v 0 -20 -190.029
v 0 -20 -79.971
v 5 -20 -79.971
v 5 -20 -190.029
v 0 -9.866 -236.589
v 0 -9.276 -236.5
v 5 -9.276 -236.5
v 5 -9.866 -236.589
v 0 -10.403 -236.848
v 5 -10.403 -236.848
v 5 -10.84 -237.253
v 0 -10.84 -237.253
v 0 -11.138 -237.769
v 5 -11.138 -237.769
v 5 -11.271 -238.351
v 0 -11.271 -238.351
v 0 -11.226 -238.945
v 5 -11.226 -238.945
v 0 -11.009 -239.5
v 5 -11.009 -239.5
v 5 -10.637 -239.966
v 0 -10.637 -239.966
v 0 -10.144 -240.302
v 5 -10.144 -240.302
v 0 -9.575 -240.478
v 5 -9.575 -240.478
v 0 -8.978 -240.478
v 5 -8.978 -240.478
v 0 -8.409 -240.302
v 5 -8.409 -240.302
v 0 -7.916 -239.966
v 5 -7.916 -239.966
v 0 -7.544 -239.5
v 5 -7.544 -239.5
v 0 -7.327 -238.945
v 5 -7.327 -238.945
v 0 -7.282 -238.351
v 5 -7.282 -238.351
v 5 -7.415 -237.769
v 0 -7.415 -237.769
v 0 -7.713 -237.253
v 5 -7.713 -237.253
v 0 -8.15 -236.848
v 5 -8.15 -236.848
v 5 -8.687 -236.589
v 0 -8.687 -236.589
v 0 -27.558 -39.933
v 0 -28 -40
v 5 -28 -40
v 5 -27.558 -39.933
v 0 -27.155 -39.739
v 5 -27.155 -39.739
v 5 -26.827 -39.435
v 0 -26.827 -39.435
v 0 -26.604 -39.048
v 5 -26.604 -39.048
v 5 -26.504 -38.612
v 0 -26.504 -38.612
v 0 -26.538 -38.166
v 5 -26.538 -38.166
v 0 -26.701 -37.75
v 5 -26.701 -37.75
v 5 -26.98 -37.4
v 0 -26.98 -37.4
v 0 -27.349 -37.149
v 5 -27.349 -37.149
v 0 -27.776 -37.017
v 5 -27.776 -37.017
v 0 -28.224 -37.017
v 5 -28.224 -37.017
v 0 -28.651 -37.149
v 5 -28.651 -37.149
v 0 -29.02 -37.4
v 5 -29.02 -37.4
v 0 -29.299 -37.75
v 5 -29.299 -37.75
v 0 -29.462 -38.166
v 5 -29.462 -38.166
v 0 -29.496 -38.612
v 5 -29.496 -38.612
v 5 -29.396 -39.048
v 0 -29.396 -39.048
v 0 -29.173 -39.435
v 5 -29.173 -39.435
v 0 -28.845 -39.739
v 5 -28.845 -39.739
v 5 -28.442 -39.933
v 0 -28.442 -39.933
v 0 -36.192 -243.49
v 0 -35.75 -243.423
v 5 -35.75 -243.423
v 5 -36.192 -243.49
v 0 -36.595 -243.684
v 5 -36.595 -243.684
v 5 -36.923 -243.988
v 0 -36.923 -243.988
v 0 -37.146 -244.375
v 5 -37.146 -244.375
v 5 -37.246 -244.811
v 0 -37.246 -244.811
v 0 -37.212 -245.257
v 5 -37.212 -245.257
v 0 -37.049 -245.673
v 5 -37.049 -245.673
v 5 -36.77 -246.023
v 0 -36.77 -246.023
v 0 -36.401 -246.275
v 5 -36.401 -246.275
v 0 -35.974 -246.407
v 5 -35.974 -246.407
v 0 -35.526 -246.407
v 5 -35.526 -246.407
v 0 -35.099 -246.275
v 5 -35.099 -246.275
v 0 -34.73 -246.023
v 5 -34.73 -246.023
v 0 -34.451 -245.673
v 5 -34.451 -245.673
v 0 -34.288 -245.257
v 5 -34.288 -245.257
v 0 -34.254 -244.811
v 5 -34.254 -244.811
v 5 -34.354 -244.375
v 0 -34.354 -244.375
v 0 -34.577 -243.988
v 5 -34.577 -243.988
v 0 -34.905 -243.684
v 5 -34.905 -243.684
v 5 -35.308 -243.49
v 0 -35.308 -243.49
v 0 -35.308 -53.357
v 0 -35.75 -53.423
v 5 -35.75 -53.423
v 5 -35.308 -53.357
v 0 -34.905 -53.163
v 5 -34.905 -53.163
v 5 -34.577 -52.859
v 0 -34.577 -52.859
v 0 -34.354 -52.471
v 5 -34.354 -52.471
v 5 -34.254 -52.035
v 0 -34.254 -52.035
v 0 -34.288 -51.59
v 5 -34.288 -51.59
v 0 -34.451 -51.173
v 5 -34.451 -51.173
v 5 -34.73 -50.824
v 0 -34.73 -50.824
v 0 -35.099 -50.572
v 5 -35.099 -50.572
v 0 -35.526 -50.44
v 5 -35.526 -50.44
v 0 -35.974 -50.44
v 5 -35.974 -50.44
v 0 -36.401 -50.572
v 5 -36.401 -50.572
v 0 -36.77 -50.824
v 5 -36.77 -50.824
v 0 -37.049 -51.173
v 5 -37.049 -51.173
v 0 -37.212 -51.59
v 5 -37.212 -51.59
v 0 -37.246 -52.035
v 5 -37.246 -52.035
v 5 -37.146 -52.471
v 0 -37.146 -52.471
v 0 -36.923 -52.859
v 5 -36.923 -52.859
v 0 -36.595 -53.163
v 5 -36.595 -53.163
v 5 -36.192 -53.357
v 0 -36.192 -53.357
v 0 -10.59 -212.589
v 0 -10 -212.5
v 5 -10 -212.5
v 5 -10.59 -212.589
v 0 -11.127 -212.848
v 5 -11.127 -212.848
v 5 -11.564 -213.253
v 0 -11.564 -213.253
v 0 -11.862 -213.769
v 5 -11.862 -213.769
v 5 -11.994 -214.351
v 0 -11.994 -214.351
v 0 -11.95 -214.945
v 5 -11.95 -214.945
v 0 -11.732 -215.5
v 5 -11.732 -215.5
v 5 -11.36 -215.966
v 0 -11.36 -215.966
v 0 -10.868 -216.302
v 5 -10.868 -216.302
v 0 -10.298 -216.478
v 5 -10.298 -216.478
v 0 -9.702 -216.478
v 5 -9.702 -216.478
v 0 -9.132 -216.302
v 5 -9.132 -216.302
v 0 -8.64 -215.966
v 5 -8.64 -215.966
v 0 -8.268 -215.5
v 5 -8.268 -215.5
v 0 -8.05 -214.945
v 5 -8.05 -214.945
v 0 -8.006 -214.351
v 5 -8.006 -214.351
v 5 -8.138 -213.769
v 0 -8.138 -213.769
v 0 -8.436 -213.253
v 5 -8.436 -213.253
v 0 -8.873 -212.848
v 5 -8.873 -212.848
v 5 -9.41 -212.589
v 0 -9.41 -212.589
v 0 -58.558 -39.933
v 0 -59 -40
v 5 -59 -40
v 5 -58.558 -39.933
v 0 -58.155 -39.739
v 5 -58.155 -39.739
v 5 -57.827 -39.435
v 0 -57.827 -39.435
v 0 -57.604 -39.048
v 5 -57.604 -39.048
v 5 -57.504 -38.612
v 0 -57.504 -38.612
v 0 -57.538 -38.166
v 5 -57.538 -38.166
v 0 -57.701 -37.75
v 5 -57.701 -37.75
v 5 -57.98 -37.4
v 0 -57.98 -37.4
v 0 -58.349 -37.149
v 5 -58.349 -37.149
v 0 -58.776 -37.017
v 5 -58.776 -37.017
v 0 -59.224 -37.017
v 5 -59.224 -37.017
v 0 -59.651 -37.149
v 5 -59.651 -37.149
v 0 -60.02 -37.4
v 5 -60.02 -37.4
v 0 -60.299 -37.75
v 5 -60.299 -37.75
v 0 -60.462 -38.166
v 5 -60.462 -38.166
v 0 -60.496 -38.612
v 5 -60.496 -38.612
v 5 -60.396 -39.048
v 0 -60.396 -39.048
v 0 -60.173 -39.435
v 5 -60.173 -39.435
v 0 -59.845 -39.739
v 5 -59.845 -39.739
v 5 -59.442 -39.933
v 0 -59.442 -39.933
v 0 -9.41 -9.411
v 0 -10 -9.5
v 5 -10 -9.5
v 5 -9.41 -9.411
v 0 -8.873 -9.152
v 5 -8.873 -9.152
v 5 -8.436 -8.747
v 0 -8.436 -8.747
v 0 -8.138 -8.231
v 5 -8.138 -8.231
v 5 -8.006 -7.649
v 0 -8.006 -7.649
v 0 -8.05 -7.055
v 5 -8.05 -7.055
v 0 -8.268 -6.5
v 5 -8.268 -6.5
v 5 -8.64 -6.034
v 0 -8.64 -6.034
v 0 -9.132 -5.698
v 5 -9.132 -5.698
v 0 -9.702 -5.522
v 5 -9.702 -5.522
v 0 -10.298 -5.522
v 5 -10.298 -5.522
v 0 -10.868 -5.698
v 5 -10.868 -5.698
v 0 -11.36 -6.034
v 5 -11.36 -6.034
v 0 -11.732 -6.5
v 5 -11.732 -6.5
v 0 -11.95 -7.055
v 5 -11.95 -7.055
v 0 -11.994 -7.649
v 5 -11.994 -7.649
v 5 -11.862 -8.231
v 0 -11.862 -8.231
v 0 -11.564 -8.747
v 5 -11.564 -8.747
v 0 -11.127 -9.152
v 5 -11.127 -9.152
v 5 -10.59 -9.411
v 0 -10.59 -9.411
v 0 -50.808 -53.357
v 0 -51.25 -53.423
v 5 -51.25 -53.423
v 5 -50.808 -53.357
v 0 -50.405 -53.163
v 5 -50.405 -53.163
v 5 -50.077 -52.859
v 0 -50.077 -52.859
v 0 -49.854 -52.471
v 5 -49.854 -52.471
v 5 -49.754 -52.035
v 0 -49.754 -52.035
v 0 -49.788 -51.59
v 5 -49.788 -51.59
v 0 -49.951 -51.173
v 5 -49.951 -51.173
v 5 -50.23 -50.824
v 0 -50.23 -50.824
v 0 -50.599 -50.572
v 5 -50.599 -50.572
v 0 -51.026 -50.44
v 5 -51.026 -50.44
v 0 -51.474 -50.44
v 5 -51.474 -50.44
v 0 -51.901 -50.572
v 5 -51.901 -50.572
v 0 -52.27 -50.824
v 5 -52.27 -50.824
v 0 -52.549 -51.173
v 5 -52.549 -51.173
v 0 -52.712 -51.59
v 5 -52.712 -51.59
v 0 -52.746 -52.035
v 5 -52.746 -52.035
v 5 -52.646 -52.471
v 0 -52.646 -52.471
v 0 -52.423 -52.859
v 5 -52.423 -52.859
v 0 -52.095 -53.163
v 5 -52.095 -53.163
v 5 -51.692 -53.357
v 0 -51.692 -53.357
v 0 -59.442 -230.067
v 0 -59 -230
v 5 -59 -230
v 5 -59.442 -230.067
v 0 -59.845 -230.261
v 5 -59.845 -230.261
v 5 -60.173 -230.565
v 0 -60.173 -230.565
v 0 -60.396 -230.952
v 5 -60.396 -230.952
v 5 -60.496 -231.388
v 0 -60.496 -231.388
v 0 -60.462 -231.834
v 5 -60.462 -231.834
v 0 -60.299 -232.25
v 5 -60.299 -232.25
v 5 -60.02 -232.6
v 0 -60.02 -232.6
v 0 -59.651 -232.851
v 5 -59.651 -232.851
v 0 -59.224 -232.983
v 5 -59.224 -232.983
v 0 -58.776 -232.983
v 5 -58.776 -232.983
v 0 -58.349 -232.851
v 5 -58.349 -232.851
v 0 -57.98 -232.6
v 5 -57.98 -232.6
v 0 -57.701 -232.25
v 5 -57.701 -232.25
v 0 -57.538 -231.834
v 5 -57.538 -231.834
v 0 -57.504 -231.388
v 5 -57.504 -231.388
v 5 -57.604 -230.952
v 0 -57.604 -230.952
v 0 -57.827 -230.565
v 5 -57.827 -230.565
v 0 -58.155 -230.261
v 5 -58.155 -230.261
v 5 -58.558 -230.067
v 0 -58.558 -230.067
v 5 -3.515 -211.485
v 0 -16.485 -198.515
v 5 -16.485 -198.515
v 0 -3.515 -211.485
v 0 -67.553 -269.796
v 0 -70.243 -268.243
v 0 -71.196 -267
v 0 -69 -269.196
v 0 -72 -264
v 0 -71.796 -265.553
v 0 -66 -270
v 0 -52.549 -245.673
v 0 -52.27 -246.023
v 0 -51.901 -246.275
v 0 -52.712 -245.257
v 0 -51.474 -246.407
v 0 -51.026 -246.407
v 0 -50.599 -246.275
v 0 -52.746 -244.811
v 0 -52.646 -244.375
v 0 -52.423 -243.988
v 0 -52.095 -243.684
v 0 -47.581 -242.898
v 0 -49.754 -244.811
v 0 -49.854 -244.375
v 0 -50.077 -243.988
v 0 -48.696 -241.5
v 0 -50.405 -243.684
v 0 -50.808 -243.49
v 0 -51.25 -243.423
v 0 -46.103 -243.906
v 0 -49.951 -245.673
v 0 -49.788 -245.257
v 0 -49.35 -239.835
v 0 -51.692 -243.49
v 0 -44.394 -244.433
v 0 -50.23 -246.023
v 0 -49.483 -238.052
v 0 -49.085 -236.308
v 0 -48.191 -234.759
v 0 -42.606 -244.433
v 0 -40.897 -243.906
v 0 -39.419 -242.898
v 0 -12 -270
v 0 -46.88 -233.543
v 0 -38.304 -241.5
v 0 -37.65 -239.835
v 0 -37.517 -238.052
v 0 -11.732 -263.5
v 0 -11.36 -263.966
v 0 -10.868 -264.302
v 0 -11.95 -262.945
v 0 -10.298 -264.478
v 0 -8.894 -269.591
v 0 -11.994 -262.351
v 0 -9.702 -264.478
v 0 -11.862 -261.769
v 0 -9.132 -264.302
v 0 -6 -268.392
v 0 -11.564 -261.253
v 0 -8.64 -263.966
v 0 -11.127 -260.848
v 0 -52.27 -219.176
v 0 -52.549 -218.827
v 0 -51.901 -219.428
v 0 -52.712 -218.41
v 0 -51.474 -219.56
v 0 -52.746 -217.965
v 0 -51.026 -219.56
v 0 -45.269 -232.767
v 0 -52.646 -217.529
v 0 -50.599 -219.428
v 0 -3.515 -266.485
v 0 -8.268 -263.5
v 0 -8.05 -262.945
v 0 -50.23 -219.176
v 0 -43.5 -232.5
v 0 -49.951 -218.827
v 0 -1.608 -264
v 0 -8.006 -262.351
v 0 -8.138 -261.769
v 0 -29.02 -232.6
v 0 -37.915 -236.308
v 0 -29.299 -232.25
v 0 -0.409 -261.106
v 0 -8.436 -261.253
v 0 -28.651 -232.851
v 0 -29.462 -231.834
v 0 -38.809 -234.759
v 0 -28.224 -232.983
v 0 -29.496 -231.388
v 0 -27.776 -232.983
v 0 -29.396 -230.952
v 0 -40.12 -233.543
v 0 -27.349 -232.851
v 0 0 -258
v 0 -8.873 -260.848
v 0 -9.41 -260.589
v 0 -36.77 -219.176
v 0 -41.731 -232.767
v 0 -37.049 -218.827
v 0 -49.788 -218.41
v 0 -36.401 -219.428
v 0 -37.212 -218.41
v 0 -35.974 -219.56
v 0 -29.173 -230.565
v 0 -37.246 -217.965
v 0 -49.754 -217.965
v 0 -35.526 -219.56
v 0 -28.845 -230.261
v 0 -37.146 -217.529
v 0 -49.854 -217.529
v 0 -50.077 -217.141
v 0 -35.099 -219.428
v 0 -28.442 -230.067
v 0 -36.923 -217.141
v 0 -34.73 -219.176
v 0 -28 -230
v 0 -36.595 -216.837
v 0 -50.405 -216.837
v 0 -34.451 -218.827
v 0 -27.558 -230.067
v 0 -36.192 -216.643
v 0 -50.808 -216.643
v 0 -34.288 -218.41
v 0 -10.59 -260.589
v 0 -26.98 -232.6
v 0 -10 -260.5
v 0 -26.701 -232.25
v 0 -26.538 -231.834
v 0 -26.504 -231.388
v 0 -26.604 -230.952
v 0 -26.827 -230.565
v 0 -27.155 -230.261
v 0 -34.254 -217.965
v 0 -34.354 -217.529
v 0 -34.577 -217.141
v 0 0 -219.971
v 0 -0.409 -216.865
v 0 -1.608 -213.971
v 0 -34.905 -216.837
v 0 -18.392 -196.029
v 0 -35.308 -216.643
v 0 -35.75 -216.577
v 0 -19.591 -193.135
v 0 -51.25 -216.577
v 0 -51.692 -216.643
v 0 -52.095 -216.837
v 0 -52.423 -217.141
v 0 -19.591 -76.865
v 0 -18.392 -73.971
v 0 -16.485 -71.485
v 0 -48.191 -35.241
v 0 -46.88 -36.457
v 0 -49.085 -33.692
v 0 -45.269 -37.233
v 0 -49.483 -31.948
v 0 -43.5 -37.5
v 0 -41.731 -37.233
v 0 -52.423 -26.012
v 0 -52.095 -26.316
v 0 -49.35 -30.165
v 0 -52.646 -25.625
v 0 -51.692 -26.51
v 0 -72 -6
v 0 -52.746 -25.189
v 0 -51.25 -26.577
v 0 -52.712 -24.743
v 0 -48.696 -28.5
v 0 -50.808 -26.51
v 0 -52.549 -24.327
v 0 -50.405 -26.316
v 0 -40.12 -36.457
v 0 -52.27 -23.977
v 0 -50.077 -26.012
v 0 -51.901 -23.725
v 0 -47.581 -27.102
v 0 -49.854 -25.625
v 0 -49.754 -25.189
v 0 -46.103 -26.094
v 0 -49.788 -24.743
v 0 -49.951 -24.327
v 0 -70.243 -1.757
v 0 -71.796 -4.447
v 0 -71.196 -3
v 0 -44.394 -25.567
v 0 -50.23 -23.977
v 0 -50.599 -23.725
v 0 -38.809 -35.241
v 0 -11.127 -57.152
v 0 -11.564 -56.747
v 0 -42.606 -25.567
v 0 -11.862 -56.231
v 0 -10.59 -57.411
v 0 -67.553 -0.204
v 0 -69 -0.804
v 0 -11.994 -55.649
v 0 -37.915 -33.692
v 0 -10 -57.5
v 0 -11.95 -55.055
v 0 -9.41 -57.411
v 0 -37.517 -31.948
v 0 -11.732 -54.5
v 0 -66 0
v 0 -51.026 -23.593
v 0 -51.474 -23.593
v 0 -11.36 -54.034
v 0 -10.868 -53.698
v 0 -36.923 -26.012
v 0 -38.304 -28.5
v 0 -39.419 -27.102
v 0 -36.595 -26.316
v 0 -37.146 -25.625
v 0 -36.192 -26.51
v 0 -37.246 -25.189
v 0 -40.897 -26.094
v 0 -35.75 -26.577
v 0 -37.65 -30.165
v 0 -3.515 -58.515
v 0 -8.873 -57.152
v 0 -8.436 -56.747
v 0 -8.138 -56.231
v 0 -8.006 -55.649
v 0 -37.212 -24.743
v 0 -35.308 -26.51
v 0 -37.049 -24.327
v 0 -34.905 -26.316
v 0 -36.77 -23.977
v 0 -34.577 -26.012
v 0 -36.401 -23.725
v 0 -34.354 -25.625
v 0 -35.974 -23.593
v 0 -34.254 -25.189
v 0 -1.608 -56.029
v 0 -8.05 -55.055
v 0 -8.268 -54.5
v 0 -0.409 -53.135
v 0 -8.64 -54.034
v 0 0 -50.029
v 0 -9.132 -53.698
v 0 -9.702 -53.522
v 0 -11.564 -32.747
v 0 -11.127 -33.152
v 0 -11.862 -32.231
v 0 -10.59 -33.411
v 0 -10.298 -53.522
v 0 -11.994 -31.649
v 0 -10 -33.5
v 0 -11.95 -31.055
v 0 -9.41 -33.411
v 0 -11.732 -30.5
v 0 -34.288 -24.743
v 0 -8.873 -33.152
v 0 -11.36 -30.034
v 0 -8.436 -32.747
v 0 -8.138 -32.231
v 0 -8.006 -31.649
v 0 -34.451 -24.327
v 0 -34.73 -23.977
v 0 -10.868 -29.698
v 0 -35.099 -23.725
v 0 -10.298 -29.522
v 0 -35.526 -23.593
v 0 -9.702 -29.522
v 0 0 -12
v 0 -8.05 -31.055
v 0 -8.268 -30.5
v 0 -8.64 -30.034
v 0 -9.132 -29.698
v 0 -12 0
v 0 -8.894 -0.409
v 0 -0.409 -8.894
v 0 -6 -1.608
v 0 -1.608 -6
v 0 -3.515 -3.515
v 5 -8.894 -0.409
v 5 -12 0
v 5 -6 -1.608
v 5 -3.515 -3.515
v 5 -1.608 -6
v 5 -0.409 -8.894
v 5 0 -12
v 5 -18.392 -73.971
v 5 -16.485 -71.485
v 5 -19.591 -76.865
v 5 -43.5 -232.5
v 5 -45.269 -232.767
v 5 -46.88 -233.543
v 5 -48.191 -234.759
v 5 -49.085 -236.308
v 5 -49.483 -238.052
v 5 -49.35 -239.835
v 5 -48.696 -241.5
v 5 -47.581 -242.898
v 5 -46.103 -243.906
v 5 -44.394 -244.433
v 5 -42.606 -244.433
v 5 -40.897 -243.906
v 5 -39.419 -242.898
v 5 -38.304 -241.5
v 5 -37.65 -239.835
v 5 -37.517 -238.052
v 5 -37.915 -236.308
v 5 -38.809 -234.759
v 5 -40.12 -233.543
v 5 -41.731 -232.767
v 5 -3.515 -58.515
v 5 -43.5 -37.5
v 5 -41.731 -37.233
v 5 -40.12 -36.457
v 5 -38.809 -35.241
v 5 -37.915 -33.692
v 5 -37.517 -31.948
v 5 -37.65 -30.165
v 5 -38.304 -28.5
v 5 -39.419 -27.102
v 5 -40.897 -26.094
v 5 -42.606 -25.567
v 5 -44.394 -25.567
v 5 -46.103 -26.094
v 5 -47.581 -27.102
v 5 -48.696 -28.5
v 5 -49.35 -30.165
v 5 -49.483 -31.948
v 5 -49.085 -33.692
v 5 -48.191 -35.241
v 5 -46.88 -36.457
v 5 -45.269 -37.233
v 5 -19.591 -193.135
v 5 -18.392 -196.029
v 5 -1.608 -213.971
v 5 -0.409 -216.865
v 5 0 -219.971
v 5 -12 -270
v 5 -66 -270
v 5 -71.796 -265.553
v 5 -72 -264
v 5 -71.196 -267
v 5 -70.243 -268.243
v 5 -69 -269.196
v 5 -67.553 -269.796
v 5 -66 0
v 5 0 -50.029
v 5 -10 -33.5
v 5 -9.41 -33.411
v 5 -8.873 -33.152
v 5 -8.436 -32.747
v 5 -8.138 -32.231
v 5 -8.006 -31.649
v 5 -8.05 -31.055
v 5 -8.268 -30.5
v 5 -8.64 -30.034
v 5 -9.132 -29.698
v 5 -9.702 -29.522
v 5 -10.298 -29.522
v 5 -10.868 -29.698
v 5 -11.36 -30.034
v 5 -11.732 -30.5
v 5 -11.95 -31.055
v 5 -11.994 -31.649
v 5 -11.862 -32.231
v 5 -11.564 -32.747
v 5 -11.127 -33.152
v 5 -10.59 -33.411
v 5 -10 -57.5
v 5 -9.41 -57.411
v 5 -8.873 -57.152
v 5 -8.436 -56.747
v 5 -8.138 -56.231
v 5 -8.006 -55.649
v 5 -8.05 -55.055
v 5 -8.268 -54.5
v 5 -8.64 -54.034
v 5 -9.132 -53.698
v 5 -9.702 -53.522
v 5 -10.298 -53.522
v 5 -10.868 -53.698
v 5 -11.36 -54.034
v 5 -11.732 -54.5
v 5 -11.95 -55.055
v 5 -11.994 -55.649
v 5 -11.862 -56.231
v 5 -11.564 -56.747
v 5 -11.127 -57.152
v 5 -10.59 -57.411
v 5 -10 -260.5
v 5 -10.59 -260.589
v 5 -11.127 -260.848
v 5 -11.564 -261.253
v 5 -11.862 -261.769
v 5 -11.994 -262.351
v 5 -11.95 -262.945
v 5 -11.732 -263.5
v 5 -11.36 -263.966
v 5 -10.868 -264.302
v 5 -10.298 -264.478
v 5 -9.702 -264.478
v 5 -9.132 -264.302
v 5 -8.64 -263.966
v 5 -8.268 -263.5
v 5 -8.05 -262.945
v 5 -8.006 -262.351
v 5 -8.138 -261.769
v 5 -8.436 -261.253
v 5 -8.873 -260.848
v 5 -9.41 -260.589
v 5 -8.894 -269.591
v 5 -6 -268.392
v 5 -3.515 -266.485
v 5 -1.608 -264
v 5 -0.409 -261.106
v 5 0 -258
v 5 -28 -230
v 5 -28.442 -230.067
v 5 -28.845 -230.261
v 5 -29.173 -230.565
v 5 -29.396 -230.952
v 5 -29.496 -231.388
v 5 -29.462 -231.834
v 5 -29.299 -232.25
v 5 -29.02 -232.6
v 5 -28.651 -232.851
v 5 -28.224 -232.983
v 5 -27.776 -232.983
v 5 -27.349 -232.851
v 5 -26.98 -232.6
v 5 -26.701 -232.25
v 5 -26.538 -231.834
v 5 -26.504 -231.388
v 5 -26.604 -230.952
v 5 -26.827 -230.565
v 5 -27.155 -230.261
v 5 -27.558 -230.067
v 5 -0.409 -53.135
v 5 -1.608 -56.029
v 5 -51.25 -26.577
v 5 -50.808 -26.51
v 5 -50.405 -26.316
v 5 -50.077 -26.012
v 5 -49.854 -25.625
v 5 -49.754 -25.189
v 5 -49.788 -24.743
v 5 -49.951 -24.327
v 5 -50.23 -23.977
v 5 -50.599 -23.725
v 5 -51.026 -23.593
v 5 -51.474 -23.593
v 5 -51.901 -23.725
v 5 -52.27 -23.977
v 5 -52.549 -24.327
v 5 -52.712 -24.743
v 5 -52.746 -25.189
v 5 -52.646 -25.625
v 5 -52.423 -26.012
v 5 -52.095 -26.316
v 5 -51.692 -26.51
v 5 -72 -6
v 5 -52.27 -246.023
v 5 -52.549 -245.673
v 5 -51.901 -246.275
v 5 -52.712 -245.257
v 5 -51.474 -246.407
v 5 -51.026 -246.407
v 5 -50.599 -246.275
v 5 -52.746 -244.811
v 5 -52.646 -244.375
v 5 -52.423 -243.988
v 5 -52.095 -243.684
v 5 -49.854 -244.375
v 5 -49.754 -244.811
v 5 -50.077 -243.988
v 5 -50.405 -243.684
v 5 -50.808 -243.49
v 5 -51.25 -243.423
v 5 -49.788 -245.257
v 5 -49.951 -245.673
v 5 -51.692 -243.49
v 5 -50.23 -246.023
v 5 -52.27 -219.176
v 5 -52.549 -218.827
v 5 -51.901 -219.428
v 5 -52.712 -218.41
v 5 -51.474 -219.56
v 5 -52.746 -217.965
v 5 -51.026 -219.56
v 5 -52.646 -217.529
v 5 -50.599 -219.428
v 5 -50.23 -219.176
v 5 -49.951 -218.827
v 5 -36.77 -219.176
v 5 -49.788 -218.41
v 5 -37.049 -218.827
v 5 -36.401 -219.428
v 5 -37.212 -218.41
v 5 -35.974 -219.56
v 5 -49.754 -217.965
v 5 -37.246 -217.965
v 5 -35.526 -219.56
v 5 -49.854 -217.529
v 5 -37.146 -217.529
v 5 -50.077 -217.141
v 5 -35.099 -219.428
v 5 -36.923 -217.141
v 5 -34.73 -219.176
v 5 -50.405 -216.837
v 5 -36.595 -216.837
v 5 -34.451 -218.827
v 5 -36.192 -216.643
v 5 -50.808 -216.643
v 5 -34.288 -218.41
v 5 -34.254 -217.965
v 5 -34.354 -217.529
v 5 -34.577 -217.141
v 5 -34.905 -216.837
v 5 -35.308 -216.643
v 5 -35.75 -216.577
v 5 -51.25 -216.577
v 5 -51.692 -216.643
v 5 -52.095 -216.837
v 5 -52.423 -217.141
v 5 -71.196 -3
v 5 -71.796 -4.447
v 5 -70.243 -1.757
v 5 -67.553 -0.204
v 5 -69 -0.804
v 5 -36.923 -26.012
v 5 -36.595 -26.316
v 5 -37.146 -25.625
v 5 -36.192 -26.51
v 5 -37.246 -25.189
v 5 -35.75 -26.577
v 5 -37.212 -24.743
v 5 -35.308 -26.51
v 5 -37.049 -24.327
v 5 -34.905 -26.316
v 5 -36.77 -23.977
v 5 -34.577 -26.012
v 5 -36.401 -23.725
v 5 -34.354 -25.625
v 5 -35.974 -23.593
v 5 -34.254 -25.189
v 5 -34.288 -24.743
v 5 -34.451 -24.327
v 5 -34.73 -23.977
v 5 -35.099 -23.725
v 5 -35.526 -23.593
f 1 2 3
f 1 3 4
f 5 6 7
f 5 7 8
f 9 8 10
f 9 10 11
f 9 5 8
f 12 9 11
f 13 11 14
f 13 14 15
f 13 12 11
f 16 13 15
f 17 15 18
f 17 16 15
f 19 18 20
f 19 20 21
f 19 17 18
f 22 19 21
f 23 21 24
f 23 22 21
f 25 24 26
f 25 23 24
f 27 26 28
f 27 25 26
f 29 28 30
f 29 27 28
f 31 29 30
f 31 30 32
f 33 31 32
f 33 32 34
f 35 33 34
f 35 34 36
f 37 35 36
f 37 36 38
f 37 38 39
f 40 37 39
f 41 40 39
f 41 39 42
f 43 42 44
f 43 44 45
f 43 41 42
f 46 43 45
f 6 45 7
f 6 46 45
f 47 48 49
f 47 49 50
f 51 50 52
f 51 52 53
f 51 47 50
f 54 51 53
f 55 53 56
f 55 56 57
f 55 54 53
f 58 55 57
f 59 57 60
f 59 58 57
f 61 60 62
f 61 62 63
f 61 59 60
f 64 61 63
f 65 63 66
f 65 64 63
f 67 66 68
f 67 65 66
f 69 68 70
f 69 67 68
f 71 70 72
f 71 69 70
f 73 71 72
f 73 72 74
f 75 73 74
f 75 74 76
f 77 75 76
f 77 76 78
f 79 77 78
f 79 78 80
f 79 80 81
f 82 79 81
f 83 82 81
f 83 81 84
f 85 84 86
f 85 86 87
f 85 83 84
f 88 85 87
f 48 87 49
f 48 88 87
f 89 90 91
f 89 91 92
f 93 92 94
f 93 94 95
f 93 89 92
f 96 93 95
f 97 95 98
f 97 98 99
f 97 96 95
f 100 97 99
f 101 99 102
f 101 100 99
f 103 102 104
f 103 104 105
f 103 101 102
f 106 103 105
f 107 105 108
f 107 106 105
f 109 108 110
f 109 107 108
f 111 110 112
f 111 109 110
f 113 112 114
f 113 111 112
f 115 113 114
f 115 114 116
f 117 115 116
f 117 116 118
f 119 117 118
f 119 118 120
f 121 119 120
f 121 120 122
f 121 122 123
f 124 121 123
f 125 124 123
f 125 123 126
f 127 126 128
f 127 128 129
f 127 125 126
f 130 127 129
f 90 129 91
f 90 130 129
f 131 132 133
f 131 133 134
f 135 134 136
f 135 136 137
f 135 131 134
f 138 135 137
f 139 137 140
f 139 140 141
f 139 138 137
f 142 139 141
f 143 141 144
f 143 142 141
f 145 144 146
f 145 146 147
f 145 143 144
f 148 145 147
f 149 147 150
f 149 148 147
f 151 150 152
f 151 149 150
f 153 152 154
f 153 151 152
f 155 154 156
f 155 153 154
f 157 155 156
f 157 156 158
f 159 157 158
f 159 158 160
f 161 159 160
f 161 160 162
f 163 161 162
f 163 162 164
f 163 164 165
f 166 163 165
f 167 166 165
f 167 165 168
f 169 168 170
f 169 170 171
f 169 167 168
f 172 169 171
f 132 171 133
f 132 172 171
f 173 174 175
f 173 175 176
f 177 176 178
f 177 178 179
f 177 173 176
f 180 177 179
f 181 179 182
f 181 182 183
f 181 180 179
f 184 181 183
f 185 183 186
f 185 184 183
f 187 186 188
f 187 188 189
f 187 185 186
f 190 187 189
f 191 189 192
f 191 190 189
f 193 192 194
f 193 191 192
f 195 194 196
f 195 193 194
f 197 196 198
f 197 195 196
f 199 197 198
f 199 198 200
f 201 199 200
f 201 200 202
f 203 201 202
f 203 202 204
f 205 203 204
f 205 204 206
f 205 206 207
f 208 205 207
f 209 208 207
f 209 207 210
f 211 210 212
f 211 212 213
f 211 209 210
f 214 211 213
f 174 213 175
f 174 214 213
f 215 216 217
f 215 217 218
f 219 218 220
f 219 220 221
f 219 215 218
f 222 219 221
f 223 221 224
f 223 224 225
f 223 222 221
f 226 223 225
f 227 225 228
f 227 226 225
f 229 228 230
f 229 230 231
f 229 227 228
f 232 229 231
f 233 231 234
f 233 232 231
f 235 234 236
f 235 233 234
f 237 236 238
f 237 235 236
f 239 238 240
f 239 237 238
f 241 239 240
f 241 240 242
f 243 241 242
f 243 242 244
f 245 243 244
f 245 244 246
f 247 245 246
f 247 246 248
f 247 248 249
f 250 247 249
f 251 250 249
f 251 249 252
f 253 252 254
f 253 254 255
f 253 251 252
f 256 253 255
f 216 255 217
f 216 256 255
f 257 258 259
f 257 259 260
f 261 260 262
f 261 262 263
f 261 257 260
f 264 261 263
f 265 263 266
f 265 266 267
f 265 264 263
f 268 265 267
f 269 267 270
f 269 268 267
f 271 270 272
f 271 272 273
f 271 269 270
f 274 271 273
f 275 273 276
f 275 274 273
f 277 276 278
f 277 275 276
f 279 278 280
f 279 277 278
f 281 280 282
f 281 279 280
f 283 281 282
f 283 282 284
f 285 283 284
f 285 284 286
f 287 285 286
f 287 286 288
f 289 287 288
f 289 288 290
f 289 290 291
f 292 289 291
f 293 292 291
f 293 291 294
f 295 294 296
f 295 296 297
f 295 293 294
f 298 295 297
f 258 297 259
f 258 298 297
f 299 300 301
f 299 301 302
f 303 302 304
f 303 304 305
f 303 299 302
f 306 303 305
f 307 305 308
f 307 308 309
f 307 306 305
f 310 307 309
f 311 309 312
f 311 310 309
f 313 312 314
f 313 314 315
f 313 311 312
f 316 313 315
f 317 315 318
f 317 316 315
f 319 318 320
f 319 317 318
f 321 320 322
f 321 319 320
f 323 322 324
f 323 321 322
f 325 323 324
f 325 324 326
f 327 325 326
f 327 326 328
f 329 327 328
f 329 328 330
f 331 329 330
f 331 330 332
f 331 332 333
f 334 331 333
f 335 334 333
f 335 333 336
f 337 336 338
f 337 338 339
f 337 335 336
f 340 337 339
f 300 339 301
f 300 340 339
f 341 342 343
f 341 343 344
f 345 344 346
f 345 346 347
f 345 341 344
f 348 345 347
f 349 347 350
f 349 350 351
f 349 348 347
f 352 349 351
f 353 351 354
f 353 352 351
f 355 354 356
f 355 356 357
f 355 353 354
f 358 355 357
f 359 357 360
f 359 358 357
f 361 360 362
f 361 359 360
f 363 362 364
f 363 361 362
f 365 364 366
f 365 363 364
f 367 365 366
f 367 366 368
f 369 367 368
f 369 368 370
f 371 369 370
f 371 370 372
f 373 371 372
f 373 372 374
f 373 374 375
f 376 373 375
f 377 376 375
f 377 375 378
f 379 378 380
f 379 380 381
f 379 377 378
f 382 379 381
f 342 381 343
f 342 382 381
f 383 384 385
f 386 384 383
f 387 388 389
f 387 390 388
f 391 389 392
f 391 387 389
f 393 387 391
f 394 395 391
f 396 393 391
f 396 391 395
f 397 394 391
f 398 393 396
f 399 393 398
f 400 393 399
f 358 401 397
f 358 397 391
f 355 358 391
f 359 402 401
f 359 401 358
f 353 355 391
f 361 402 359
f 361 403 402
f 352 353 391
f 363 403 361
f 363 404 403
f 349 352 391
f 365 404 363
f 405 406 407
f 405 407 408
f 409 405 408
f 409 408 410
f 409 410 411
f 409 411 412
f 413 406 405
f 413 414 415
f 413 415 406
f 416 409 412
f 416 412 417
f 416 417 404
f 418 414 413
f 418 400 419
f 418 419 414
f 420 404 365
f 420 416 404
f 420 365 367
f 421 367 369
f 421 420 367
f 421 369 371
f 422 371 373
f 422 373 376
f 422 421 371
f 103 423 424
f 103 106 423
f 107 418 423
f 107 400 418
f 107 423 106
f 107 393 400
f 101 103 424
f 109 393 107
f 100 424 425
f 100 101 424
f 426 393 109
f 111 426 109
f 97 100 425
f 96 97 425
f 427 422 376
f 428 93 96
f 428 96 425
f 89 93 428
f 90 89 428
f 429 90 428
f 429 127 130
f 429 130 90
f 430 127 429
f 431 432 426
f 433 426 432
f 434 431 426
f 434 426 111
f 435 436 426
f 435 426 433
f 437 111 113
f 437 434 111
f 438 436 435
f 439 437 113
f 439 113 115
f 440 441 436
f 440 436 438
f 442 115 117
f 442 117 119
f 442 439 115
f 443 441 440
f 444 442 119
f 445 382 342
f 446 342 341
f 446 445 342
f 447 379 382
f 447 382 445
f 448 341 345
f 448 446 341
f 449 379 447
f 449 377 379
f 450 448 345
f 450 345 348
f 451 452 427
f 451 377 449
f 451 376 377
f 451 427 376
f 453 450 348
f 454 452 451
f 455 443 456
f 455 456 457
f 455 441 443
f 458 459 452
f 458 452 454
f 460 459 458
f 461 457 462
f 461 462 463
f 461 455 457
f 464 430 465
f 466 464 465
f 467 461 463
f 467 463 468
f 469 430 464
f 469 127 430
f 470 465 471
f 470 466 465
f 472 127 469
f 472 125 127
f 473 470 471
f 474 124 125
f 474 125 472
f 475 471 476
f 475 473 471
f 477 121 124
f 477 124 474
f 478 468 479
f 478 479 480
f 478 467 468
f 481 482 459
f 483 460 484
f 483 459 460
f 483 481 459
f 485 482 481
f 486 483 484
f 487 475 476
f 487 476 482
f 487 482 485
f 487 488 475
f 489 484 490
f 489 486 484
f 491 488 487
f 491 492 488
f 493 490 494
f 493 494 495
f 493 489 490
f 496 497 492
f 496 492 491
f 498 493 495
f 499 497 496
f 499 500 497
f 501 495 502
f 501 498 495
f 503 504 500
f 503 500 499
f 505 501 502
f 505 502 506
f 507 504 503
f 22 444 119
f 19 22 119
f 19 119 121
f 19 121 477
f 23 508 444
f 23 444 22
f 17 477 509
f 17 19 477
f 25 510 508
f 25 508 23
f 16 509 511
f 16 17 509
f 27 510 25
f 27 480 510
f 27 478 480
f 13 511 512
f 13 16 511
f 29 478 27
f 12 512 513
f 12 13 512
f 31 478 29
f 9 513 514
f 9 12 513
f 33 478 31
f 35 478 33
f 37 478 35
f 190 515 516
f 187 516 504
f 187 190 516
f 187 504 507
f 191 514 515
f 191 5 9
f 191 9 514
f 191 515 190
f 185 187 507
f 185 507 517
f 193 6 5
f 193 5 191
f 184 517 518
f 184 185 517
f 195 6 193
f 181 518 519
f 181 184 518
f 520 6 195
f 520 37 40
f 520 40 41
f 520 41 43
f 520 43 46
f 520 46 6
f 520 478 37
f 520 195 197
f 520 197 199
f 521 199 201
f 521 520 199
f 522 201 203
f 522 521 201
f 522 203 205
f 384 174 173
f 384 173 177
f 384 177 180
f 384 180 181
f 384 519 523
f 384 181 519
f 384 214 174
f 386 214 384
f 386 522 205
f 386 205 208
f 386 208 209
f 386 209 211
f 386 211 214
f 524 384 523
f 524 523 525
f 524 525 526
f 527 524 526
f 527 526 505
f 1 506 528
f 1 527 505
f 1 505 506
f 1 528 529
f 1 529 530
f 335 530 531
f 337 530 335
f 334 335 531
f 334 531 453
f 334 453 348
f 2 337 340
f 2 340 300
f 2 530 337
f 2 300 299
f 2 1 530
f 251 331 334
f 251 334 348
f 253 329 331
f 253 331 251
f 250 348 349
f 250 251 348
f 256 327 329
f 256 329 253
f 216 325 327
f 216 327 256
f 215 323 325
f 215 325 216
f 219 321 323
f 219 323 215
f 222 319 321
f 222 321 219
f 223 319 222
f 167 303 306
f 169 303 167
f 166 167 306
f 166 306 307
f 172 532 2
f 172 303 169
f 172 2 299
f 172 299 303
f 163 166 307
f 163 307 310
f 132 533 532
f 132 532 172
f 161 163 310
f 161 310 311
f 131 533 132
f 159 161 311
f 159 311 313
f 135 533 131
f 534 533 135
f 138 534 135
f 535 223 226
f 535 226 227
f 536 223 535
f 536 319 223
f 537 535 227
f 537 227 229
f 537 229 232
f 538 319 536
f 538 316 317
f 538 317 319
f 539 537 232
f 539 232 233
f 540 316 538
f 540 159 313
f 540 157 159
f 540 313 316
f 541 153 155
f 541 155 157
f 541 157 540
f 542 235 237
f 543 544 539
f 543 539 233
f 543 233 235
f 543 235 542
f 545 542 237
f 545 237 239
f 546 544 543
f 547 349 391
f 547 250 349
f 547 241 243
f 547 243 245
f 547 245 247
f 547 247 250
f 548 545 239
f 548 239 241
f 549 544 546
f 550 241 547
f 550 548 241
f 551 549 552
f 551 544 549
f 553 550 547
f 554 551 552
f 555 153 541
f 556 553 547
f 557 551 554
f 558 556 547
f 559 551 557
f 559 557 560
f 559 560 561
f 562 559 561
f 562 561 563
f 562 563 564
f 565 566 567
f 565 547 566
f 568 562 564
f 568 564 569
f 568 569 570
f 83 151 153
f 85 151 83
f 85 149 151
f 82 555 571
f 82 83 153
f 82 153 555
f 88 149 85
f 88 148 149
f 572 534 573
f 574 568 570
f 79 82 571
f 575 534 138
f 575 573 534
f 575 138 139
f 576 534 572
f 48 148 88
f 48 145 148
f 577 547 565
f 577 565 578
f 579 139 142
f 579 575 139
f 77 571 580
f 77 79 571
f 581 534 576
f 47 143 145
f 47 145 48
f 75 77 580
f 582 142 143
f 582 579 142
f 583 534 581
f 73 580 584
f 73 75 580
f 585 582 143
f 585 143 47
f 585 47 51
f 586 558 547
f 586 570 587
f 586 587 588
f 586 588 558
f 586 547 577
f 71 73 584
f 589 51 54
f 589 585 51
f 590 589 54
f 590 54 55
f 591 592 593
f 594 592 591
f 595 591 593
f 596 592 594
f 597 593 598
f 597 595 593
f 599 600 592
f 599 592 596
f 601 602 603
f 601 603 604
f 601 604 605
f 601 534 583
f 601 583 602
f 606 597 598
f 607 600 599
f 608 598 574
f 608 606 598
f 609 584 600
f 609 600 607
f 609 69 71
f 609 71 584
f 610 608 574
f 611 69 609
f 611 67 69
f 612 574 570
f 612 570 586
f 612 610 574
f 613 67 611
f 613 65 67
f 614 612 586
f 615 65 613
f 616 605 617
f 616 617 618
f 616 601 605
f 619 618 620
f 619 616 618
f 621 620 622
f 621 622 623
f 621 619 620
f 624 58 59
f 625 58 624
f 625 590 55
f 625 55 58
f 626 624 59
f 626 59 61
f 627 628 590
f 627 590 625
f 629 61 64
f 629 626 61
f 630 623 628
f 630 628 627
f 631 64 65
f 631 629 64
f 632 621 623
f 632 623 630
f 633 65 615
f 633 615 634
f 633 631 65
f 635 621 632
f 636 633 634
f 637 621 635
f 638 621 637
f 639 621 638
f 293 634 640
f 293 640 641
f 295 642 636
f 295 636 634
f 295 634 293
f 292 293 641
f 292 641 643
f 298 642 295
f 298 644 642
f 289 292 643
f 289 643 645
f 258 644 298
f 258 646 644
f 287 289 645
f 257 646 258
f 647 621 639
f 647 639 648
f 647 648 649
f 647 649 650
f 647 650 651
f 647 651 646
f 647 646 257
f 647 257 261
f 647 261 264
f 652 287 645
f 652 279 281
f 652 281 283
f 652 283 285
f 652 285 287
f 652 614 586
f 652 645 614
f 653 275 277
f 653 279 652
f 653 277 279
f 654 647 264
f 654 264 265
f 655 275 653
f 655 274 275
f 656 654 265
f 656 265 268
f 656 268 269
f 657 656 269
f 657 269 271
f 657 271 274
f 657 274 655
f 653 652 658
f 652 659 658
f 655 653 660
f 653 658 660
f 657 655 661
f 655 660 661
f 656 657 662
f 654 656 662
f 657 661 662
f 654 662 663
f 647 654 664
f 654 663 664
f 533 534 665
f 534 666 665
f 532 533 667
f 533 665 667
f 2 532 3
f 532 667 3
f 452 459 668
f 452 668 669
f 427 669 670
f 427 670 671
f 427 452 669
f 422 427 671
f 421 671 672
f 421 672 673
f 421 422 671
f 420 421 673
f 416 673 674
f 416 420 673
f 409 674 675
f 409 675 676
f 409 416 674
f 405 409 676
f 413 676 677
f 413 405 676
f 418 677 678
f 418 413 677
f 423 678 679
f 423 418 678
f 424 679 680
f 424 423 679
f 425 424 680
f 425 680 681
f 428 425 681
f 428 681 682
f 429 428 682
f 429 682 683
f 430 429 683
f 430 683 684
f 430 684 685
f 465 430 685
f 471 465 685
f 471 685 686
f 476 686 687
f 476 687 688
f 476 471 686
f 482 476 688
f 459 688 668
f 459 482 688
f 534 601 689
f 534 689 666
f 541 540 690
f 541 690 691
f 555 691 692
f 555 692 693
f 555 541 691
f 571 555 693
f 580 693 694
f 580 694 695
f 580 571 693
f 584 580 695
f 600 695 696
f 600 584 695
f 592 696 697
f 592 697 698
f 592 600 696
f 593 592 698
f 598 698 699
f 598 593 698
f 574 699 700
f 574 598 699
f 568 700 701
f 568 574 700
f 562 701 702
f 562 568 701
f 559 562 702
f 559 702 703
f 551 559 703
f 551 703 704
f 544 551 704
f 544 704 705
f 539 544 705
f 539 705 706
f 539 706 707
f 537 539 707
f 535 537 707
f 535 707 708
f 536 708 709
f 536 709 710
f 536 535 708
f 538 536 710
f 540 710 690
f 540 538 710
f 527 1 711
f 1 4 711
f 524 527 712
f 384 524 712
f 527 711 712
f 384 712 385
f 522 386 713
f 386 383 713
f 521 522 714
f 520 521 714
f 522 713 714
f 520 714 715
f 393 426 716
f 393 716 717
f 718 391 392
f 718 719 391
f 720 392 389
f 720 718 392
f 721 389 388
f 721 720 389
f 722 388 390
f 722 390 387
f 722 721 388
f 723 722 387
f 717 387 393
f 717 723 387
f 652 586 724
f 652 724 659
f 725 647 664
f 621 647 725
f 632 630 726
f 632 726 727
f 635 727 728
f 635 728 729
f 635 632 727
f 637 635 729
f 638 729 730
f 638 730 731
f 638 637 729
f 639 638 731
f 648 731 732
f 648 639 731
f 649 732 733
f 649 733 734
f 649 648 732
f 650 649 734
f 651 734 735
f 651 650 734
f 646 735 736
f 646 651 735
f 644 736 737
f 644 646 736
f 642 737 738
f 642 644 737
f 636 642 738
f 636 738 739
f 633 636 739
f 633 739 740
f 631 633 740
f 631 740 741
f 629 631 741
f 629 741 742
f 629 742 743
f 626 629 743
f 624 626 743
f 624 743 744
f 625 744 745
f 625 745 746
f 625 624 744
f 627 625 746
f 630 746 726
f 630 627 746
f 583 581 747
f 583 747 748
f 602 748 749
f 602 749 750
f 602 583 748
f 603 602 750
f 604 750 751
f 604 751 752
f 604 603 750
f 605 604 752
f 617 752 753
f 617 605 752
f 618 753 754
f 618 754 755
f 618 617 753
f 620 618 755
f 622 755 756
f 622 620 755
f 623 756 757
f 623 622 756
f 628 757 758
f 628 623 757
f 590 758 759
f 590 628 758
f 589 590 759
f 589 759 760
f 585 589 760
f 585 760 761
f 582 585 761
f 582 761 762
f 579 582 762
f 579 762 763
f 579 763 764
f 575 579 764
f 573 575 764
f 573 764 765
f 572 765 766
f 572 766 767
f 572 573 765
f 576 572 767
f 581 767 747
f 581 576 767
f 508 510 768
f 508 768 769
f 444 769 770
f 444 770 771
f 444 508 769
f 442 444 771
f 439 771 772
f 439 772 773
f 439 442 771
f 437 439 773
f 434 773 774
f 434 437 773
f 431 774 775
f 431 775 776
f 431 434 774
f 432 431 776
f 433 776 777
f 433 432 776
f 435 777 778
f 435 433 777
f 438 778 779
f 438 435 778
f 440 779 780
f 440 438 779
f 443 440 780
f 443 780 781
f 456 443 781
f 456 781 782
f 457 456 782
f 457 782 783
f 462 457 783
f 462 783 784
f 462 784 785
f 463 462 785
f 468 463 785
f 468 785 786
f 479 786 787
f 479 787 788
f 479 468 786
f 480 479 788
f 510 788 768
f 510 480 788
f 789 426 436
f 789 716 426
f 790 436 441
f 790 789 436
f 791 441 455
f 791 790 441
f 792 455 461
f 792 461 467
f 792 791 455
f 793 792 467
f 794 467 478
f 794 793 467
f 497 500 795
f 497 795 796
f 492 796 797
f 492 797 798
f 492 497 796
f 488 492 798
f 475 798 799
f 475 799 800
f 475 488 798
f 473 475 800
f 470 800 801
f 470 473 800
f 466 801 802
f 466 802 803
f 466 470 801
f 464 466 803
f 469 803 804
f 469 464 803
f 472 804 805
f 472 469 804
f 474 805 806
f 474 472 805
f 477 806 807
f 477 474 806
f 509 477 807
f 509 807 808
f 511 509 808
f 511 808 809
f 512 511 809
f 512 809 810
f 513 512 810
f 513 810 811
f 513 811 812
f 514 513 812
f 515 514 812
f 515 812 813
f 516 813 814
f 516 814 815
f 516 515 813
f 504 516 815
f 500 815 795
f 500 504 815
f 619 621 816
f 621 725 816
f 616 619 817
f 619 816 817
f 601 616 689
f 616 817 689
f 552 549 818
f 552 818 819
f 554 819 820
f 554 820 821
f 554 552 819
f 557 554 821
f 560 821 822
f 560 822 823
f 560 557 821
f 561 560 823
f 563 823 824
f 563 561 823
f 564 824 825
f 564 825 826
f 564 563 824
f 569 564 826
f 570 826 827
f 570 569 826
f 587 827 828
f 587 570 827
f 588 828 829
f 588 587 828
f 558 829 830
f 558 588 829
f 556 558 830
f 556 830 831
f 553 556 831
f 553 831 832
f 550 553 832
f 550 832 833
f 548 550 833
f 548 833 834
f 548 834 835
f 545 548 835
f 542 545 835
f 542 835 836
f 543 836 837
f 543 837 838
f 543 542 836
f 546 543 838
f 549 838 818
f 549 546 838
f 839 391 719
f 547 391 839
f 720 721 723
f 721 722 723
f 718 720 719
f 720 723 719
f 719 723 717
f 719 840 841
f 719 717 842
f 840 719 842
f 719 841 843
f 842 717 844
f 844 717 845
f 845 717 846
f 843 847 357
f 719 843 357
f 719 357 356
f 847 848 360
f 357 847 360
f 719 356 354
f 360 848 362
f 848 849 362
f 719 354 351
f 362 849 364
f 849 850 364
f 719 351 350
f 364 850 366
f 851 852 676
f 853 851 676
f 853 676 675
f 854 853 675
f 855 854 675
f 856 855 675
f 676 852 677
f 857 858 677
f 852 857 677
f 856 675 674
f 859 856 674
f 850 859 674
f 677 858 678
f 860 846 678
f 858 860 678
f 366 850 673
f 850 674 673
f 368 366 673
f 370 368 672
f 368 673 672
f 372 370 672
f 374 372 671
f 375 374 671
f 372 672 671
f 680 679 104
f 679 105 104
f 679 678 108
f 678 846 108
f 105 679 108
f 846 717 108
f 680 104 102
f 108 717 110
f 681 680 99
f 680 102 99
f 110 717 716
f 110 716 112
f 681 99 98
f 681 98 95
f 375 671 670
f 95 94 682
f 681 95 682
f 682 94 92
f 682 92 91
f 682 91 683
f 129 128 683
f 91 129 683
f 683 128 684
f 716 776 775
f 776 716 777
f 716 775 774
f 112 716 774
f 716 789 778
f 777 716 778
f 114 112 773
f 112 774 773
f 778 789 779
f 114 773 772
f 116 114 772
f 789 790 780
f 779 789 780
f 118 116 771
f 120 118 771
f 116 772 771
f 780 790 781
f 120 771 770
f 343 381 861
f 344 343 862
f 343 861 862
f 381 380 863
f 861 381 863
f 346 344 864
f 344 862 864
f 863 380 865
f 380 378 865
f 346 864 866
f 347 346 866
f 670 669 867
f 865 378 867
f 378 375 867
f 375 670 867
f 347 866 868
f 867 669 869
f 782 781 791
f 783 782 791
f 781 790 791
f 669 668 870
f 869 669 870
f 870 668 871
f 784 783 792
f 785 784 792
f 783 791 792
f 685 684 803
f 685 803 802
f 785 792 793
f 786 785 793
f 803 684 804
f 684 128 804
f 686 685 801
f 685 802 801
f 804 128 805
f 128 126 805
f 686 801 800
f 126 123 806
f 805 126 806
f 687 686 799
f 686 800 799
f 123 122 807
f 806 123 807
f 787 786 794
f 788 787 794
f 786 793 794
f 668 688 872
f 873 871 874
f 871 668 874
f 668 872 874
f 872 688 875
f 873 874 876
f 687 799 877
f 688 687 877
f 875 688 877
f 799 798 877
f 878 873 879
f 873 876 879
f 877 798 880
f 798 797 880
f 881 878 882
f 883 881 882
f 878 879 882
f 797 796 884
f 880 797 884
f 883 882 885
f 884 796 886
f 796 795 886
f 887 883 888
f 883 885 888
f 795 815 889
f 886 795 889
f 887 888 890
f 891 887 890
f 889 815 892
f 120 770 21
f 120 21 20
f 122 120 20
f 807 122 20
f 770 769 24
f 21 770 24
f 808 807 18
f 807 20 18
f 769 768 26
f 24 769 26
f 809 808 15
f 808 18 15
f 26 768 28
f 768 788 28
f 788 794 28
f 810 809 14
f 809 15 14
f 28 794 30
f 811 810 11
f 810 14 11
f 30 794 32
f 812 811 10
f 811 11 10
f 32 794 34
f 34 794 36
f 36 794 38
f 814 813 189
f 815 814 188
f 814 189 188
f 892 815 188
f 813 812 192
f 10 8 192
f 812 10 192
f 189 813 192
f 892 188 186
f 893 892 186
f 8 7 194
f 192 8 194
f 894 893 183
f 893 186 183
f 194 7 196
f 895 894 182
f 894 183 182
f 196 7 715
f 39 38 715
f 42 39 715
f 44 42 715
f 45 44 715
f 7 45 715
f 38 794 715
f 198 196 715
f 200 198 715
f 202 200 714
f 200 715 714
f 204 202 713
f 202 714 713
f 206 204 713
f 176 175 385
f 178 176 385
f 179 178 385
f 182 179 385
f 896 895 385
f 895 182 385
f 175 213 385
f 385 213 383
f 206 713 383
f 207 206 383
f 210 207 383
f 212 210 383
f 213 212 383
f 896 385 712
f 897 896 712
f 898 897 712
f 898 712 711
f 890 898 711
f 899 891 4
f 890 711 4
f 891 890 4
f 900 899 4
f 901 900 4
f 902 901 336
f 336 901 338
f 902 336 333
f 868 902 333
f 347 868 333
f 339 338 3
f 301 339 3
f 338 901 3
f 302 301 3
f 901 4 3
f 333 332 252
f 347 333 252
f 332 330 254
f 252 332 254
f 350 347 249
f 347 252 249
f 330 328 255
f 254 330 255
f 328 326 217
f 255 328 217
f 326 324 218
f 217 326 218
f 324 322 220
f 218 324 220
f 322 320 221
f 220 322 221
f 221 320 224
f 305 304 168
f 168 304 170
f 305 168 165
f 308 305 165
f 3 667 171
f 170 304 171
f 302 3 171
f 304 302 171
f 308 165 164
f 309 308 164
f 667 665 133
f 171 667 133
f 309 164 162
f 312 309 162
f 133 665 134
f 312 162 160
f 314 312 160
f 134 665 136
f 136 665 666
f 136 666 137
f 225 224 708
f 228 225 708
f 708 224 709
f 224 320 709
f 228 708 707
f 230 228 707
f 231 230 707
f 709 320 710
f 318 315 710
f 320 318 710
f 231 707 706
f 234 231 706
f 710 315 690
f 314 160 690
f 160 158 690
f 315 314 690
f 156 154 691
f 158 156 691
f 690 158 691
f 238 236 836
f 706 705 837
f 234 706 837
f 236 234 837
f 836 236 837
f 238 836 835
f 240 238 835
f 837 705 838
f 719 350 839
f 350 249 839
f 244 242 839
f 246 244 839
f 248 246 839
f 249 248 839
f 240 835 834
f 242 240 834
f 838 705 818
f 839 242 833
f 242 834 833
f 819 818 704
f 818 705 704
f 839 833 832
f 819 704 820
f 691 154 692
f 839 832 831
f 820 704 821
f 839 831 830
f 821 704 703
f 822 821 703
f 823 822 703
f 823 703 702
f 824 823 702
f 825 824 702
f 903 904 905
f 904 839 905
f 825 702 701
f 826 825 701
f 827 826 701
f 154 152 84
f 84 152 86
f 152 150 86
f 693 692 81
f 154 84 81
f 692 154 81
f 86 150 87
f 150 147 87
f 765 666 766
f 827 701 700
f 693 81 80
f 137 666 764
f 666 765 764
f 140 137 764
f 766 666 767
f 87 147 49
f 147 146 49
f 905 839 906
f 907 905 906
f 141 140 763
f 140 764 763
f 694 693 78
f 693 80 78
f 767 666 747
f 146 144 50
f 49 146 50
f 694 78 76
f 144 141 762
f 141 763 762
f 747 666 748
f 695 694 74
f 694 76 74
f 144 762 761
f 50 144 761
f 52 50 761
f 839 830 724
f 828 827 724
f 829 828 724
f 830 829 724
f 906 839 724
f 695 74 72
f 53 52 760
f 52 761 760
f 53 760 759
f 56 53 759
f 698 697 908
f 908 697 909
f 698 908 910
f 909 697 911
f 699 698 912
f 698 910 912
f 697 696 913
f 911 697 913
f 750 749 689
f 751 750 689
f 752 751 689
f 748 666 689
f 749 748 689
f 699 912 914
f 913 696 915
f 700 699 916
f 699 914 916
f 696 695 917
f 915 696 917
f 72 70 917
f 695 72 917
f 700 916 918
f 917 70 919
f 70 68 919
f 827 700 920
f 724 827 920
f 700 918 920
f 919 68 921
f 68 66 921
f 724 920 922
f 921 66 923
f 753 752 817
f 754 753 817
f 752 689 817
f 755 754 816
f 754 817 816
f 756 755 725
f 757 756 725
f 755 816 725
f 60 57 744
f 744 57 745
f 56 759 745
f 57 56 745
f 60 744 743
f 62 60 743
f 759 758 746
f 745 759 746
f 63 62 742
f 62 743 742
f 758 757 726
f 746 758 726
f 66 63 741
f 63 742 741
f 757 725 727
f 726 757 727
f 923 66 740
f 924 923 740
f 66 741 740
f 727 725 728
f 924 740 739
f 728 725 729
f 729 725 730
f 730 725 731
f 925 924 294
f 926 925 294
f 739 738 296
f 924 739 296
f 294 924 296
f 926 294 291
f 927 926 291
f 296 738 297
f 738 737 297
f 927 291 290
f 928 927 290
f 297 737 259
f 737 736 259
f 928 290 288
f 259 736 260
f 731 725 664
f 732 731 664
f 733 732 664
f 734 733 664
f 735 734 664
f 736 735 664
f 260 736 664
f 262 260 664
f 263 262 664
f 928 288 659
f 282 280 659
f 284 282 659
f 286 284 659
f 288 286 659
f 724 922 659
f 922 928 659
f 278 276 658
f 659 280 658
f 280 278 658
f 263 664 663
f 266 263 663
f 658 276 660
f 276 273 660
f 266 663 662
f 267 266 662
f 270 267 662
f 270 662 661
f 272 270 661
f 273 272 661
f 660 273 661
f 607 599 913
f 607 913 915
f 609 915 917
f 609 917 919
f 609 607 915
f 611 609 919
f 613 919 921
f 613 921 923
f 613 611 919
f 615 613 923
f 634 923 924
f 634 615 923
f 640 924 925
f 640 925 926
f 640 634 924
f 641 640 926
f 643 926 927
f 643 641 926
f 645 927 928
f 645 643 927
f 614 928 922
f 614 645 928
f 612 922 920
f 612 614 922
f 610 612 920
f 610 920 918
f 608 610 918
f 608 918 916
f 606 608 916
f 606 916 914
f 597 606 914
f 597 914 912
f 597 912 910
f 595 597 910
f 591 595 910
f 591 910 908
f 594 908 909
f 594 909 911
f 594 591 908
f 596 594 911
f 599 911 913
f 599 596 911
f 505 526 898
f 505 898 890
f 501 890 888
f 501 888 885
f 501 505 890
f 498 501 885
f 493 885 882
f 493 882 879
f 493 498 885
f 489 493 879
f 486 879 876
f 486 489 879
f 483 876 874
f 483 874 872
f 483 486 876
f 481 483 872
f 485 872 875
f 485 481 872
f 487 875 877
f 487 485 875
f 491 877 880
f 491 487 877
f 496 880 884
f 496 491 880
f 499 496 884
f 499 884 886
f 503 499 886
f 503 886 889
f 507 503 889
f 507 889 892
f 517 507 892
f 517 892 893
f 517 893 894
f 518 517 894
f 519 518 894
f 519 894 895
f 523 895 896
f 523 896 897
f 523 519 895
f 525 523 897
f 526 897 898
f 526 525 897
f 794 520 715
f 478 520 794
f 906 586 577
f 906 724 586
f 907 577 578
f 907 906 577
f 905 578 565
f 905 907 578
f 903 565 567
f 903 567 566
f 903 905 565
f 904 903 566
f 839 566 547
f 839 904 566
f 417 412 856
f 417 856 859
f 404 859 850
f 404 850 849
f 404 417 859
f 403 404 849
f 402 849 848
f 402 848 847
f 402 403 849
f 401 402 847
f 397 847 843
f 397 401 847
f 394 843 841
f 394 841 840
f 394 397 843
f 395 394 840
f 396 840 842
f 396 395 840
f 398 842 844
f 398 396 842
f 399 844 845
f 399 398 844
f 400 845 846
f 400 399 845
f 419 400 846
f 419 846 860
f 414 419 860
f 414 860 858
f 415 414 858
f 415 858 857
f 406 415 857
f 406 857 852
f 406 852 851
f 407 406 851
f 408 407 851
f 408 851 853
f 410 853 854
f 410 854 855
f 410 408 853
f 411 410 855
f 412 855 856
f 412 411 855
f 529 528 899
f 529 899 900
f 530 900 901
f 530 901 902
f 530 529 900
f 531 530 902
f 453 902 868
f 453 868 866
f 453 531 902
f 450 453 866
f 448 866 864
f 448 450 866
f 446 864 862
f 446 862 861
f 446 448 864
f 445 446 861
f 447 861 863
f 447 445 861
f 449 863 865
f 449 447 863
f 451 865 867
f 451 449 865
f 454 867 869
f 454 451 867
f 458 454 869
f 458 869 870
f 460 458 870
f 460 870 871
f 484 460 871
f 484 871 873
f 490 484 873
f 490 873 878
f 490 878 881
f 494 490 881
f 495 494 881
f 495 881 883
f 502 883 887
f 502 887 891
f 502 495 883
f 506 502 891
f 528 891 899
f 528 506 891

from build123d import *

# Parameters (mm, degrees)
SKETCH1_R           = 6
SKETCH1_R_2         = 2
SKETCH1_R_3         = 1.5
BOSS_EXTRUDE1_DEPTH = 5
FILLET1_R           = 6
FILLET2_R           = 12


with BuildPart() as part:
    # Sketch1 → Boss-Extrude1 (new body)
    with BuildSketch(Plane(origin=(0, 0, 0), x_dir=(0, 0, -1), z_dir=(1, 0, 0))):
        Polygon((0, 0), (55, 0), (75, -20), (195, -20), (215, 0), (270, 0), (270, -72), (0, -72), align=None)
        with Locations((31.5, -43.5)):
            Circle(SKETCH1_R, mode=Mode.SUBTRACT)
        with Locations((55.5, -10)):
            Circle(SKETCH1_R_2, mode=Mode.SUBTRACT)
        with Locations((7.5, -10)):
            Circle(SKETCH1_R_2, mode=Mode.SUBTRACT)
        with Locations((38.5, -59)):
            Circle(SKETCH1_R_3, mode=Mode.SUBTRACT)
        with Locations((25.076606241, -51.25)):
            Circle(SKETCH1_R_3, mode=Mode.SUBTRACT)
        with Locations((25.076606241, -35.75)):
            Circle(SKETCH1_R_3, mode=Mode.SUBTRACT)
        with Locations((38.5, -28)):
            Circle(SKETCH1_R_3, mode=Mode.SUBTRACT)
        with Locations((51.923393759, -35.75)):
            Circle(SKETCH1_R_3, mode=Mode.SUBTRACT)
        with Locations((51.923393759, -51.25)):
            Circle(SKETCH1_R_3, mode=Mode.SUBTRACT)
        with Locations(Location((214.5, -10, 0), (0, 0, 180))):
            Circle(SKETCH1_R_2, mode=Mode.SUBTRACT)
        with Locations(Location((238.5, -9.276470083, 0), (0, 0, 180))):
            Circle(SKETCH1_R_2, mode=Mode.SUBTRACT)
        with Locations(Location((262.5, -10, 0), (0, 0, 180))):
            Circle(SKETCH1_R_2, mode=Mode.SUBTRACT)
        with Locations(Location((244.923393759, -35.75, 0), (0, 0, 180))):
            Circle(SKETCH1_R_3, mode=Mode.SUBTRACT)
        with Locations(Location((231.5, -28, 0), (0, 0, 180))):
            Circle(SKETCH1_R_3, mode=Mode.SUBTRACT)
        with Locations(Location((218.076606241, -35.75, 0), (0, 0, 180))):
            Circle(SKETCH1_R_3, mode=Mode.SUBTRACT)
        with Locations(Location((218.076606241, -51.25, 0), (0, 0, 180))):
            Circle(SKETCH1_R_3, mode=Mode.SUBTRACT)
        with Locations(Location((231.5, -59, 0), (0, 0, 180))):
            Circle(SKETCH1_R_3, mode=Mode.SUBTRACT)
        with Locations(Location((244.923393759, -51.25, 0), (0, 0, 180))):
            Circle(SKETCH1_R_3, mode=Mode.SUBTRACT)
        with Locations(Location((238.5, -43.5, 0), (0, 0, 180))):
            Circle(SKETCH1_R, mode=Mode.SUBTRACT)
        with Locations((31.5, -10)):
            Circle(SKETCH1_R_2, mode=Mode.SUBTRACT)
    extrude(amount=BOSS_EXTRUDE1_DEPTH)

    # Fillet1
    fillet1_edges = [part.edges().sort_by_distance(p)[0] for p in [
        (2.5, -72, -270),
        (2.5, -72, 0),
    ]]
    fillet(fillet1_edges, radius=FILLET1_R)

    # Fillet2
    fillet2_edges = [part.edges().sort_by_distance(p)[0] for p in [
        (2.5, 0, 0),
        (2.5, 0, -55),
        (2.5, -20, -75),
        (2.5, -20, -195),
        (2.5, 0, -215),
        (2.5, 0, -270),
    ]]
    fillet(fillet2_edges, radius=FILLET2_R)


solid = part.part
